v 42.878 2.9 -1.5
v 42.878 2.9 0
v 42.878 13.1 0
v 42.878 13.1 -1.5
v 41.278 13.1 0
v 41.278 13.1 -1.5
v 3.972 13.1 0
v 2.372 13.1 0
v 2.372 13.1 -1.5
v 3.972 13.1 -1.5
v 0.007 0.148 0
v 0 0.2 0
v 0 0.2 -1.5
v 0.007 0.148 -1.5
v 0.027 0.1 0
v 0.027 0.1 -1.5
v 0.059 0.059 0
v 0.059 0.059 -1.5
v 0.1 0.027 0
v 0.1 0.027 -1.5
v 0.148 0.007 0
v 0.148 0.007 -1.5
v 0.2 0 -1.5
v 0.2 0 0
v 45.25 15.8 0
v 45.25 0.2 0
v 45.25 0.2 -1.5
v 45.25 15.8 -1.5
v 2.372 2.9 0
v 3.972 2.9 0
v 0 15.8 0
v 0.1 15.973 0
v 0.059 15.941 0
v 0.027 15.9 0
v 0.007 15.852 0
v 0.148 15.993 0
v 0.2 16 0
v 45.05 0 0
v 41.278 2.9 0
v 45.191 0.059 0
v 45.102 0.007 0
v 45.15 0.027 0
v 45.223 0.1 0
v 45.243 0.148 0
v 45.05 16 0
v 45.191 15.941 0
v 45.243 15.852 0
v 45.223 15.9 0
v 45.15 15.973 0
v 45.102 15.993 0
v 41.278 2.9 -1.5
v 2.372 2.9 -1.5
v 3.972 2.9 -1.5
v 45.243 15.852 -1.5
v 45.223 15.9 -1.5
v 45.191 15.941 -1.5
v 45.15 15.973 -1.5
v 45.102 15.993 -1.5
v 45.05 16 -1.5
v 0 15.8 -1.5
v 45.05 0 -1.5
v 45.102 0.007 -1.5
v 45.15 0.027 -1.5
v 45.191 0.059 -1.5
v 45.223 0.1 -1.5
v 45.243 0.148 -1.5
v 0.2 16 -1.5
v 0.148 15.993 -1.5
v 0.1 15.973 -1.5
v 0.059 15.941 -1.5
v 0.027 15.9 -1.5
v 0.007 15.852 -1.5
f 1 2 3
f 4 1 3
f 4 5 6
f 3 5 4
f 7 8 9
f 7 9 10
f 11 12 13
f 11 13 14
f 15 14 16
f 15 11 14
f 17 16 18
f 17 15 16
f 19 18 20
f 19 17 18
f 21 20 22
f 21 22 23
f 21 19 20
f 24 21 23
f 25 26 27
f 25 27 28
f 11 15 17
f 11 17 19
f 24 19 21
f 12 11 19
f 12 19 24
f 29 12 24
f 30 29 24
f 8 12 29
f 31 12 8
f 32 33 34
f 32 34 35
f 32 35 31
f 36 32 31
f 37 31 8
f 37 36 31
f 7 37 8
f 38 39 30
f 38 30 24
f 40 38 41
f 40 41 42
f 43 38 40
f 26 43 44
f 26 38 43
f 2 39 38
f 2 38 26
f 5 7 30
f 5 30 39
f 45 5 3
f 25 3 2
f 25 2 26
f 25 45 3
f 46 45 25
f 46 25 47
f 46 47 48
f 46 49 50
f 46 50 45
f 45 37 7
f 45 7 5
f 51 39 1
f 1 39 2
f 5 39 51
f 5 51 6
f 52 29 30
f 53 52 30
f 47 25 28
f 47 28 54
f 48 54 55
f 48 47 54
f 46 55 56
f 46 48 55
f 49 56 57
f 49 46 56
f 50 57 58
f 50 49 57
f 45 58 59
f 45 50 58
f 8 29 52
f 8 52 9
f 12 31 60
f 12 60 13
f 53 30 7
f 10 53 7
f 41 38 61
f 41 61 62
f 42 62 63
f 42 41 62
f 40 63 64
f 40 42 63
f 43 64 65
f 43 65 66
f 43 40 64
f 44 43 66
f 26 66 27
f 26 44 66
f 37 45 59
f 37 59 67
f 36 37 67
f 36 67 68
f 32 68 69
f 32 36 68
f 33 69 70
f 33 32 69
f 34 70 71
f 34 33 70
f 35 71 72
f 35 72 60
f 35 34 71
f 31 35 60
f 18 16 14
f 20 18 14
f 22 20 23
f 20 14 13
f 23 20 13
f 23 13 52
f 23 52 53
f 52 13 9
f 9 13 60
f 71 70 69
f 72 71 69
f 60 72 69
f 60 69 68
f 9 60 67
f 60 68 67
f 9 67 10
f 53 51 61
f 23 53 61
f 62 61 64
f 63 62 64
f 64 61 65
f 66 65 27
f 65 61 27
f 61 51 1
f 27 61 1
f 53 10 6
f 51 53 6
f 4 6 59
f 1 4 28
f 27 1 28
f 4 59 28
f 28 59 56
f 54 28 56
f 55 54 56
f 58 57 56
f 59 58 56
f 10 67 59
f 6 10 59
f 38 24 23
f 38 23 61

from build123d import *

# Parameters (mm, degrees)
SKETCH1_W          = 1.6
SKETCH1_H          = 10.2
BASE_FLANGE1_DEPTH = 1.5


# Sheet-metal steps are written as plain solids
with BuildPart() as part:
    # Sketch1 → Base-Flange1 (new body)
    with BuildSketch(Plane.XY):
        with BuildLine():
            Line((0.2, 0), (45.05, 0))
            ThreePointArc((45.05, 0), (45.191421356, 0.058578644), (45.25, 0.2))
            Line((45.25, 0.2), (45.25, 15.8))
            ThreePointArc((45.25, 15.8), (45.191421356, 15.941421356), (45.05, 16))
            Line((45.05, 16), (0.2, 16))
            ThreePointArc((0.2, 16), (0.058578644, 15.941421356), (0, 15.8))
            Line((0, 15.8), (0, 0.2))
            ThreePointArc((0, 0.2), (0.058578644, 0.058578644), (0.2, 0))
        make_face()
        with Locations((3.172093023, 8)):
            Rectangle(SKETCH1_W, SKETCH1_H, mode=Mode.SUBTRACT)
        with Locations((42.077906977, 8)):
            Rectangle(SKETCH1_W, SKETCH1_H, mode=Mode.SUBTRACT)
    extrude(amount=-BASE_FLANGE1_DEPTH)


solid = part.part
